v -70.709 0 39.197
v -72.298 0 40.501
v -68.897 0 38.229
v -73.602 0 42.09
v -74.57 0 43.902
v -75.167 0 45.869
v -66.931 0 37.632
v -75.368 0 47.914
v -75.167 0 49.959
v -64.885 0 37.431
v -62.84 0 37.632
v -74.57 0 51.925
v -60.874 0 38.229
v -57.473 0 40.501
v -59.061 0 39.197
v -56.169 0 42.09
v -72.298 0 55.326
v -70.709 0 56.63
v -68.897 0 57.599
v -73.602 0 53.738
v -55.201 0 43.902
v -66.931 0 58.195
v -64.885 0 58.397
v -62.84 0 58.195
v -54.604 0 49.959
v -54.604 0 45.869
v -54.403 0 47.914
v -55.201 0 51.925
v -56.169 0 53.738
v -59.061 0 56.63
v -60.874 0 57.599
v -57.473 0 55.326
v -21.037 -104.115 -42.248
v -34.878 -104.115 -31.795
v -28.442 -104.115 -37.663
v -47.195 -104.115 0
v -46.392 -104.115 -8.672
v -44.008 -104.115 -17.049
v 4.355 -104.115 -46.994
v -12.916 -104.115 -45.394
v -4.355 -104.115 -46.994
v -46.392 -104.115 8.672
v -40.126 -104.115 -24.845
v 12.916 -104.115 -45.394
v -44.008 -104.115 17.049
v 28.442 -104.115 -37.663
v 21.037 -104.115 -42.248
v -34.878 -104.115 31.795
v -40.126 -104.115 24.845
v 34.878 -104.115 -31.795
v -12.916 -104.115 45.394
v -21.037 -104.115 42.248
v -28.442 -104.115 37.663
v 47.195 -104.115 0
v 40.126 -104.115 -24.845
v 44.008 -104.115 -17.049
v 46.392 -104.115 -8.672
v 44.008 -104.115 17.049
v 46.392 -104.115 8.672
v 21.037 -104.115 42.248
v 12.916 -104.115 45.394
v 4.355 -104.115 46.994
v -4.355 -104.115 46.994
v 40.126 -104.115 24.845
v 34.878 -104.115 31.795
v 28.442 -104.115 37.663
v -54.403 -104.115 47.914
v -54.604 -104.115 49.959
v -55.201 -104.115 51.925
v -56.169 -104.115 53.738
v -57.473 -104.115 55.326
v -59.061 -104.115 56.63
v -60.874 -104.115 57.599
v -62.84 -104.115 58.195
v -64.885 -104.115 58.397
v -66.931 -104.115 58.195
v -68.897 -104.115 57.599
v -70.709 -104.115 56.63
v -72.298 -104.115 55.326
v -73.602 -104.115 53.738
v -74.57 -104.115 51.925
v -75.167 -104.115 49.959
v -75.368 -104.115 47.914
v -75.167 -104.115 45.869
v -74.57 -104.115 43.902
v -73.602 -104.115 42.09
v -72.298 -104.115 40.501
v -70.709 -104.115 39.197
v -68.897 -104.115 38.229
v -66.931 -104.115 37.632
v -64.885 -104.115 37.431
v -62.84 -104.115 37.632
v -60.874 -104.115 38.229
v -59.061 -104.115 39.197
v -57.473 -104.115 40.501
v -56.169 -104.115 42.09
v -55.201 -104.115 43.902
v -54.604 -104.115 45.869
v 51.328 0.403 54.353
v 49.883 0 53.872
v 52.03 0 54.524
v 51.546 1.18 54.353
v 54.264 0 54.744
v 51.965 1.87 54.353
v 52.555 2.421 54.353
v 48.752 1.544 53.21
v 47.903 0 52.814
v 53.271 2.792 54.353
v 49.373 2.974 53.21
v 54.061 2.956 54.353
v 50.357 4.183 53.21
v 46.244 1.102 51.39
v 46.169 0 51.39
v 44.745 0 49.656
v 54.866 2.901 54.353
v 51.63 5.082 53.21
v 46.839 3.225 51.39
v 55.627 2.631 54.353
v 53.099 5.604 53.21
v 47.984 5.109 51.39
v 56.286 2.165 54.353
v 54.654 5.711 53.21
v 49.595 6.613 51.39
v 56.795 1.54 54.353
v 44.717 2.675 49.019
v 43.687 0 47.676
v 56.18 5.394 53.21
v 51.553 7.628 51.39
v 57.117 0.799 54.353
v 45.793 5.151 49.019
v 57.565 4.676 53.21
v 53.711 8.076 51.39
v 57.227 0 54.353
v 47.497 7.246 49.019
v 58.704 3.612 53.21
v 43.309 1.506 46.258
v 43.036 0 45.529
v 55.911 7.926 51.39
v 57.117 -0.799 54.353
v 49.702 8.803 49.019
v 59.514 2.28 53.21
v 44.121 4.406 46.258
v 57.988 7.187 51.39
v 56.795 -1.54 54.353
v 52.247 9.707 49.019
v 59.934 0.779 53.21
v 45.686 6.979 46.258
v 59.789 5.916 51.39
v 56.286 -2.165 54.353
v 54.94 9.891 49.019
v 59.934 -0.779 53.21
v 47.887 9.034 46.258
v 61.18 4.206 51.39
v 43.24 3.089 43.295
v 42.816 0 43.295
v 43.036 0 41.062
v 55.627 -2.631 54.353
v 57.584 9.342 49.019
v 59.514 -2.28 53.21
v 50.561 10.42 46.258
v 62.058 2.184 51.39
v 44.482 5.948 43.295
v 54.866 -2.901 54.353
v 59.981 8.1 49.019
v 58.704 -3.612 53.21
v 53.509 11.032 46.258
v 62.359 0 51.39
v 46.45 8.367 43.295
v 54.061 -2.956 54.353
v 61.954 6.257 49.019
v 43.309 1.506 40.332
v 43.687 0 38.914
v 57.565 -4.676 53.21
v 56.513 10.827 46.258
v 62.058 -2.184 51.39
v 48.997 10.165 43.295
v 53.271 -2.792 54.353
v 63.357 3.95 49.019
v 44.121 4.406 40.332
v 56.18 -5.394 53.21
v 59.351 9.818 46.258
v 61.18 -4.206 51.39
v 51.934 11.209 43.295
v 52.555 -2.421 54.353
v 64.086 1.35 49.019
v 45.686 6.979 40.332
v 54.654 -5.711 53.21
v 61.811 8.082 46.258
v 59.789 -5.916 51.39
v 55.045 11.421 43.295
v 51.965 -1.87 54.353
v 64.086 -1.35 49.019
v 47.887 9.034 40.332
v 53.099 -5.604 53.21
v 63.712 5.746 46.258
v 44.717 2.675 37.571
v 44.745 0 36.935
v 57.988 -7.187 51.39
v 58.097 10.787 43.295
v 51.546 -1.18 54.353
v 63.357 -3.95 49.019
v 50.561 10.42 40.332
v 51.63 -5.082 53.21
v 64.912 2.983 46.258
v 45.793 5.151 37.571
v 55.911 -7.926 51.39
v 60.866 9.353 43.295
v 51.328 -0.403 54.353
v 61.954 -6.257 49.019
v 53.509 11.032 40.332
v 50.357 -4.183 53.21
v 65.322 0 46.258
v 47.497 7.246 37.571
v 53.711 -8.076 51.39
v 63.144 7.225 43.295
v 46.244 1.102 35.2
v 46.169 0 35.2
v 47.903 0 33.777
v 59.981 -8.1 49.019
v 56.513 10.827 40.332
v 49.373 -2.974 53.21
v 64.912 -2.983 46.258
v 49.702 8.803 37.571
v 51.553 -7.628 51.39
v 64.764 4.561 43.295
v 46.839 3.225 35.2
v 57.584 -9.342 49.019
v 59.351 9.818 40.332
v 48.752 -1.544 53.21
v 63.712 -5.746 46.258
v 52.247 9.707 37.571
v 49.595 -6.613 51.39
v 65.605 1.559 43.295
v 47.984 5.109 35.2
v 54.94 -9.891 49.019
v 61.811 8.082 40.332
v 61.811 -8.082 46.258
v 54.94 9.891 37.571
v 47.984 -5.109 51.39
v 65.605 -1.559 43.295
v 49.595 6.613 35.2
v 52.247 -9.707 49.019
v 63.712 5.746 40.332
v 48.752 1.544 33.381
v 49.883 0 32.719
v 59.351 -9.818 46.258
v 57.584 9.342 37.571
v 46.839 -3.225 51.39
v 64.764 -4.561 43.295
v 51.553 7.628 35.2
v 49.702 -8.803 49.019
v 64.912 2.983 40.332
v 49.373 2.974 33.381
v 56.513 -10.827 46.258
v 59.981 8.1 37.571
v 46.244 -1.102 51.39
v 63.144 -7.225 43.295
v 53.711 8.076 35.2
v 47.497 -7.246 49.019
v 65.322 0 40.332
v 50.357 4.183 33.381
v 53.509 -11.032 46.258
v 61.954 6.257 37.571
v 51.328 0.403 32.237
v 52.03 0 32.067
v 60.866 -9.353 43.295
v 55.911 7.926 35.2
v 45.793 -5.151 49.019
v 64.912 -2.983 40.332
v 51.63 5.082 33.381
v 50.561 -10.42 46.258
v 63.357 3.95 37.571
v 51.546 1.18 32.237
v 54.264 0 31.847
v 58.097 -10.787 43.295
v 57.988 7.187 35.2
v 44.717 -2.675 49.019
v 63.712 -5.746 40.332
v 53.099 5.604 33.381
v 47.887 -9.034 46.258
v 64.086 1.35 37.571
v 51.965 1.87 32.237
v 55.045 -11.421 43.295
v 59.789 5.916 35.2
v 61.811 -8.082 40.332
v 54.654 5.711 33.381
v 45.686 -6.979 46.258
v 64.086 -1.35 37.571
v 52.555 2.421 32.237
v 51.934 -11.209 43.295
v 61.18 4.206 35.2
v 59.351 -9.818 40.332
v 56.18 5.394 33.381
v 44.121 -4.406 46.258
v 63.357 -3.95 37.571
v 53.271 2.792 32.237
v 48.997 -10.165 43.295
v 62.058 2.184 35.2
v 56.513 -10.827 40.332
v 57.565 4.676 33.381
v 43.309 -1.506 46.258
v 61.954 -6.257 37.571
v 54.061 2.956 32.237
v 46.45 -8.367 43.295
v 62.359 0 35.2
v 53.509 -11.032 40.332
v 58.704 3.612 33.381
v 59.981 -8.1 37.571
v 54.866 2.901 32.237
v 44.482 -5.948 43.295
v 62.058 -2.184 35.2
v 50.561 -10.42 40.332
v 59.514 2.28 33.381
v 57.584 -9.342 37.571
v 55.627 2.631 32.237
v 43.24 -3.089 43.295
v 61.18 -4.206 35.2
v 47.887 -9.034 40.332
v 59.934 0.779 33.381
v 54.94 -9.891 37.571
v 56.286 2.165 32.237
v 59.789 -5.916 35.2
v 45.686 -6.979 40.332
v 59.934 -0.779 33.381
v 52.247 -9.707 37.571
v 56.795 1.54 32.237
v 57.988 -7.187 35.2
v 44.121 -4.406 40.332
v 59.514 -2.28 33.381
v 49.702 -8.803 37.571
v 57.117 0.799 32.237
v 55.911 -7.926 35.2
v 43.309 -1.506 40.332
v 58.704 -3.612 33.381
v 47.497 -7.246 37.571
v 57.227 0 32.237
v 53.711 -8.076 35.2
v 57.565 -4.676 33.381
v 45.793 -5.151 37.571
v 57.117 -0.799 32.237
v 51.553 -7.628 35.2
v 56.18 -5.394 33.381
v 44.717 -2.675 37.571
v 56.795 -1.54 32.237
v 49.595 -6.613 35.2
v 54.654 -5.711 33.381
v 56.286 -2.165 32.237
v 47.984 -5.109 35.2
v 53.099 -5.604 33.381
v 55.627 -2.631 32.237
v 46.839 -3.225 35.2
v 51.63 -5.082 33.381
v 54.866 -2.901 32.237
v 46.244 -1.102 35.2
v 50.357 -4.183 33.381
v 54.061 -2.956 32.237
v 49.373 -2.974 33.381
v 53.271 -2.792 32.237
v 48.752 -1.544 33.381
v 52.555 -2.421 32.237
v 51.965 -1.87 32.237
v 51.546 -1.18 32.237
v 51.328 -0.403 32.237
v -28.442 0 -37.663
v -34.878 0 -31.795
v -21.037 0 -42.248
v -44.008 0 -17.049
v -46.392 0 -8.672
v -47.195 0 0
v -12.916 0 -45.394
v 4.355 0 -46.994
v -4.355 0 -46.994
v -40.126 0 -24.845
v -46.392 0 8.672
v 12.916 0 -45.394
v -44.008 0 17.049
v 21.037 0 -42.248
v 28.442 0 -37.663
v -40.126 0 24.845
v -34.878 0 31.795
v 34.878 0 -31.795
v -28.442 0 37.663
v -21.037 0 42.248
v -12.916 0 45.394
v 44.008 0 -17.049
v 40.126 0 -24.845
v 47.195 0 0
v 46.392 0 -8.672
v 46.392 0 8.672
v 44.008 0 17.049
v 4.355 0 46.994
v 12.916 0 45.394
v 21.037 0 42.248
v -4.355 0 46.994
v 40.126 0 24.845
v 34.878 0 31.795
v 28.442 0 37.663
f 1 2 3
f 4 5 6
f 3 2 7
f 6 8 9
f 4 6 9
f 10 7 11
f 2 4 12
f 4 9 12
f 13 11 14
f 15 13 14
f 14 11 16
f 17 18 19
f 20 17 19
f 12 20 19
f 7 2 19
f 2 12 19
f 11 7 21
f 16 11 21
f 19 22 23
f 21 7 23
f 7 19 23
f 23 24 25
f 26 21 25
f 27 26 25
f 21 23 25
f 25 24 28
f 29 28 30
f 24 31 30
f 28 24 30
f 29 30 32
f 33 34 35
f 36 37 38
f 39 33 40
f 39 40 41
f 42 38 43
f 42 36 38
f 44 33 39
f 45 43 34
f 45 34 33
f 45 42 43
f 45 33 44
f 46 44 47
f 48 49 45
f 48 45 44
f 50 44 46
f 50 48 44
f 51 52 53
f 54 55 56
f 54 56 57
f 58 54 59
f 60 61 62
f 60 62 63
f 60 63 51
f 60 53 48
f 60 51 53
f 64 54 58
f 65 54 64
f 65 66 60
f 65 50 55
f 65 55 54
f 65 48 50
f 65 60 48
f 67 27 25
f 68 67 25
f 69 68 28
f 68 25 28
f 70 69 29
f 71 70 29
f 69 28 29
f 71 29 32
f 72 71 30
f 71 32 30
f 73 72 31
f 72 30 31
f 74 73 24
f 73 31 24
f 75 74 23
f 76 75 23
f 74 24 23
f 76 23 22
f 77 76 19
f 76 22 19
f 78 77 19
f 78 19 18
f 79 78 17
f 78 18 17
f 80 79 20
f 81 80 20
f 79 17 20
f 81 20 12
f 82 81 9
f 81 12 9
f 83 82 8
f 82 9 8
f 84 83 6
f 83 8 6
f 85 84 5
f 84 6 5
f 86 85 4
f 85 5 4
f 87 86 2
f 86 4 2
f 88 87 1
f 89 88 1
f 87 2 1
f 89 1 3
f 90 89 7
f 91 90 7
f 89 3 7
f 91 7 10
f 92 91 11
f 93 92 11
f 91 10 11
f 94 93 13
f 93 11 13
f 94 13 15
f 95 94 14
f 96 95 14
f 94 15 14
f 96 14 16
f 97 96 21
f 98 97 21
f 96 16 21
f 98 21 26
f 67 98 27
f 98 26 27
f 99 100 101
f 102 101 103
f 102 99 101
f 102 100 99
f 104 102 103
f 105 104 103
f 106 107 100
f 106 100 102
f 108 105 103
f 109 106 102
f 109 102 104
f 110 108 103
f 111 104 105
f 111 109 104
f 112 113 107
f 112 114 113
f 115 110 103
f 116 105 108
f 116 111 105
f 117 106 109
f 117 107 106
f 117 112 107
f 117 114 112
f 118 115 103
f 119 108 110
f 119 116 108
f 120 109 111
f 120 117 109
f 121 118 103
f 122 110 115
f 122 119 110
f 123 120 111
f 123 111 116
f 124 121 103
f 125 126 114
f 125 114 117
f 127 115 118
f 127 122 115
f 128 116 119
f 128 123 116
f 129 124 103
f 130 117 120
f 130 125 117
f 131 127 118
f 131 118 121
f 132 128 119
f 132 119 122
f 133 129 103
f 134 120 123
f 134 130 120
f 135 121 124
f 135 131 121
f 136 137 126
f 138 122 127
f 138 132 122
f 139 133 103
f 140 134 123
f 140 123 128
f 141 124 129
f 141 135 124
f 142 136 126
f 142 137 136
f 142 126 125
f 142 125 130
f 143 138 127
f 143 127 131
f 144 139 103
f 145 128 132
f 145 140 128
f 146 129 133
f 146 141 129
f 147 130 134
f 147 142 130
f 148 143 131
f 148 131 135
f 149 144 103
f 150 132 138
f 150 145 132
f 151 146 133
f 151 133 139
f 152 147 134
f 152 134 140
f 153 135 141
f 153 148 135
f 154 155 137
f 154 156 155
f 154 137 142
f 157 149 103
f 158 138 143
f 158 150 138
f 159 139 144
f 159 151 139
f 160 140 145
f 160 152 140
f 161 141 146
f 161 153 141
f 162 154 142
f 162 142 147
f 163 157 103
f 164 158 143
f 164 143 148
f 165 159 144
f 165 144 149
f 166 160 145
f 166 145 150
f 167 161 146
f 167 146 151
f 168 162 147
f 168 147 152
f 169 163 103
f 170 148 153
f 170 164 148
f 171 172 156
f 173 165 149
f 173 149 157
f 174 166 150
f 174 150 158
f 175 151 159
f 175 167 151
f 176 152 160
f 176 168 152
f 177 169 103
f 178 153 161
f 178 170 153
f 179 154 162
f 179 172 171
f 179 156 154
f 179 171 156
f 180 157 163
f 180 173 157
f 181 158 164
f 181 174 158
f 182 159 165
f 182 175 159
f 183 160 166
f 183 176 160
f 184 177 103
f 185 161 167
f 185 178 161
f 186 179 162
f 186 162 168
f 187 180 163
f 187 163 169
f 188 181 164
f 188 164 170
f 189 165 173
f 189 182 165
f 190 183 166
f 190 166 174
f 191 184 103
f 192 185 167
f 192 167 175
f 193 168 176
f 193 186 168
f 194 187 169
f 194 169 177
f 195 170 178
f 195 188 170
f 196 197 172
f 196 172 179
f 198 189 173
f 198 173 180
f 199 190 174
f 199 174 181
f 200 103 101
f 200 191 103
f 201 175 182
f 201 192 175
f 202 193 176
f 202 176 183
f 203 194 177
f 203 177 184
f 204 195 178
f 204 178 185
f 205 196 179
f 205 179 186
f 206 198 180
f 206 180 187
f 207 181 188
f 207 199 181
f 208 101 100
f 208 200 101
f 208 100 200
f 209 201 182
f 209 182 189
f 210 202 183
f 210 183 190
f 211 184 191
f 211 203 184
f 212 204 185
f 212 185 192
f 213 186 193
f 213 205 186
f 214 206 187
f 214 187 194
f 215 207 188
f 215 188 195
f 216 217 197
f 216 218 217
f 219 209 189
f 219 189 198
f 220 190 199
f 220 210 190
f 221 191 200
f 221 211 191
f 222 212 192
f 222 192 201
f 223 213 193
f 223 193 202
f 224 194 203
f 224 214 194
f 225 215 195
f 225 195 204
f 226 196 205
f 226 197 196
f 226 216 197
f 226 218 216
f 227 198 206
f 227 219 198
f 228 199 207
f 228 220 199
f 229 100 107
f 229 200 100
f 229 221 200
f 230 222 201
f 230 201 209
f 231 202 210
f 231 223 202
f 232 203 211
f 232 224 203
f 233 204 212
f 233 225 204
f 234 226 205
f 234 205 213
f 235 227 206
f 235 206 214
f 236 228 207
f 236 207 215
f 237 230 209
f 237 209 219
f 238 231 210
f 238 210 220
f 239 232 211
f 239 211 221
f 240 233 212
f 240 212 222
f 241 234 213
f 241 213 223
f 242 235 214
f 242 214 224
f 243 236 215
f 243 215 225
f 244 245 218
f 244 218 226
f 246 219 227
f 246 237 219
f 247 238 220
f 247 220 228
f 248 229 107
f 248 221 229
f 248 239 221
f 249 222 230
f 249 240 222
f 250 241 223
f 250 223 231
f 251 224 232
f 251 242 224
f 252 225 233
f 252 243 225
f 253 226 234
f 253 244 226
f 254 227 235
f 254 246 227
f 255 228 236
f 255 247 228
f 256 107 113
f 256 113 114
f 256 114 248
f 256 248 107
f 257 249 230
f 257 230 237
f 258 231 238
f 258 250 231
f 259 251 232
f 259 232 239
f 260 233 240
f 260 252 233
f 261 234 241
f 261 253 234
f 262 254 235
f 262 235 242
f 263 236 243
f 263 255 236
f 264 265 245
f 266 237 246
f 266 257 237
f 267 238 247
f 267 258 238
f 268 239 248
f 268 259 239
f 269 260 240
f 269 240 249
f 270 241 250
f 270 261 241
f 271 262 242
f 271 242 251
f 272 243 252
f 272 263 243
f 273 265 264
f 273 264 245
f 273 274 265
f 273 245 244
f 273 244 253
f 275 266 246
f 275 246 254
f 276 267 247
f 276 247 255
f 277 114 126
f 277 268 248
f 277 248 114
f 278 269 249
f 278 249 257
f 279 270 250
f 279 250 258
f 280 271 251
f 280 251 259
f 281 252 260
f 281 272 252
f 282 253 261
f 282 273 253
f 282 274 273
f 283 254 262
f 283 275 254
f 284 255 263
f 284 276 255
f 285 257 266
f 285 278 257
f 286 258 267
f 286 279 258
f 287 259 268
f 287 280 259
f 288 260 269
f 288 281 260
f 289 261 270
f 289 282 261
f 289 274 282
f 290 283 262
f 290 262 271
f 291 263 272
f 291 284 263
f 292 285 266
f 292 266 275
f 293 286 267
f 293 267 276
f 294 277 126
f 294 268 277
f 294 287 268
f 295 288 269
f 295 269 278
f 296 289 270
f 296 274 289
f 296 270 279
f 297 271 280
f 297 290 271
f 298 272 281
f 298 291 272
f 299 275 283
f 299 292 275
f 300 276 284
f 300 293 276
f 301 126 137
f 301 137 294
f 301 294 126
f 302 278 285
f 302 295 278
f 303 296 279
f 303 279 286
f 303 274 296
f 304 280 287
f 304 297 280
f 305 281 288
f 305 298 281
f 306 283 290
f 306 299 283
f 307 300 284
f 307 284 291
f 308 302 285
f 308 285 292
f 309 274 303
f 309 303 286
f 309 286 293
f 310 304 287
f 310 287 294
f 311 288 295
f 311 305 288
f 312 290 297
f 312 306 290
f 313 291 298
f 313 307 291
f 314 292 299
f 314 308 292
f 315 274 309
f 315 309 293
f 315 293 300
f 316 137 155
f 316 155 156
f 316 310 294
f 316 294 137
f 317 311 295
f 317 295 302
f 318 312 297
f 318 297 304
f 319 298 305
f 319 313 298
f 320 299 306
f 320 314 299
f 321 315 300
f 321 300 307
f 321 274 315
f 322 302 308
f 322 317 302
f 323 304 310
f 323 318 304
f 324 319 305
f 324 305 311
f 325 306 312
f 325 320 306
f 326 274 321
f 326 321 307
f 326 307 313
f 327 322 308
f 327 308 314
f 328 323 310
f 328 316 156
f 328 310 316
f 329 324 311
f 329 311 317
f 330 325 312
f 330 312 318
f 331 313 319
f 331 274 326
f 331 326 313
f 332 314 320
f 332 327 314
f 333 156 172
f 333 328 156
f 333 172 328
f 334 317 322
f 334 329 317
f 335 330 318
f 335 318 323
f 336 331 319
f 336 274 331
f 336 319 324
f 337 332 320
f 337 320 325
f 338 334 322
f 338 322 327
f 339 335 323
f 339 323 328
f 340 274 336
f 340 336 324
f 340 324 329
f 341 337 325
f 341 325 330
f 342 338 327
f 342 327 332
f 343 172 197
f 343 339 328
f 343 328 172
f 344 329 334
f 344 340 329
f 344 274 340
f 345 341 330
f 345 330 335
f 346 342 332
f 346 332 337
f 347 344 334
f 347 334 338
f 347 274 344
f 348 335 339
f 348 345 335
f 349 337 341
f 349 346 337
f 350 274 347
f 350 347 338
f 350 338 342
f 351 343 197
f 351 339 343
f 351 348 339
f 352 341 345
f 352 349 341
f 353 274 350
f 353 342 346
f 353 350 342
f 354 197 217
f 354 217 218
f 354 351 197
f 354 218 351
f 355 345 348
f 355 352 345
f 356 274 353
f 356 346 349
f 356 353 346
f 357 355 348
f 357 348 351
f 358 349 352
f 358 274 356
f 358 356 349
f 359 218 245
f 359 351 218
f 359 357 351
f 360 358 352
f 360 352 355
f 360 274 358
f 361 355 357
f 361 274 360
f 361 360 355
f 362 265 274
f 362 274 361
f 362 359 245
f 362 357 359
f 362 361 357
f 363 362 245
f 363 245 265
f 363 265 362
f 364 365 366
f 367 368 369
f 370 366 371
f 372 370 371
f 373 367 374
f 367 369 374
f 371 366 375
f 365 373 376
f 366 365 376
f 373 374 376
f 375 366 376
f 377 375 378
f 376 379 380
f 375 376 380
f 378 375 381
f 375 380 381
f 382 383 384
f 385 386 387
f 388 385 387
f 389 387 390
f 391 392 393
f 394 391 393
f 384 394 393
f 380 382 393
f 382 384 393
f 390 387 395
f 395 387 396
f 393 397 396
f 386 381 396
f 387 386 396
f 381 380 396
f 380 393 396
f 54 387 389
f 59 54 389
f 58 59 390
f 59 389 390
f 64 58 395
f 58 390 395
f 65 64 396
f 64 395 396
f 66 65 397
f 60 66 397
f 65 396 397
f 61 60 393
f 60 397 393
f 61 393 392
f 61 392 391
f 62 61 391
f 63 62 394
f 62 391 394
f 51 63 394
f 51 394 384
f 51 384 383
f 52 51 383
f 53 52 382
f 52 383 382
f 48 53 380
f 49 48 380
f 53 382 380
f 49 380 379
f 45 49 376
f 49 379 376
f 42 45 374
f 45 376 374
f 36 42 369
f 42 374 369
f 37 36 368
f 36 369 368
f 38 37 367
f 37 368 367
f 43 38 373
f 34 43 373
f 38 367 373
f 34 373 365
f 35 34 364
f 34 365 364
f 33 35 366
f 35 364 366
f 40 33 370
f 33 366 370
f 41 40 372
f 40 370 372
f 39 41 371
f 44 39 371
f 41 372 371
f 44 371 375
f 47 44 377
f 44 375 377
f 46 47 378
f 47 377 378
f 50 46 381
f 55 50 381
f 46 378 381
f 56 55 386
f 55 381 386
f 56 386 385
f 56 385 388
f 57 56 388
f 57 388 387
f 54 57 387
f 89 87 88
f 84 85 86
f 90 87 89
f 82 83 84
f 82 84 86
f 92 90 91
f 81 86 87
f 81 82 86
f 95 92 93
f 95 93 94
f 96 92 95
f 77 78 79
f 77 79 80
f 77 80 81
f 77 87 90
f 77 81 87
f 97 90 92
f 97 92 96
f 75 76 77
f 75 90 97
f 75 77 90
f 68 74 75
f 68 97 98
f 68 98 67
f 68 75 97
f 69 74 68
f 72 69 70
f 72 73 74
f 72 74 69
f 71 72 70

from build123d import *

# Parameters (mm, degrees)
F2_R     = 10.482872
F2_R_2   = 47.195497
F3_DEPTH = 104.1151


with BuildPart() as f1:
    # F0 (on Front) → F1 (revolve)
    with BuildSketch(Plane.XZ):
        with BuildLine():
            Line((54.263636, 31.847387), (54.263636, 54.743521))
            ThreePointArc((54.263636, 54.743521), (42.815569, 43.295454), (54.263636, 31.847387))
        make_face()
    revolve(axis=Axis((54.263636, 0, 43.295454), (0, 0, -1)))


with BuildPart() as f3:
    # F2 (on Front) → F3 (new body)
    with BuildSketch(Plane.XZ):
        with Locations((-64.885452, 47.913637)):
            Circle(F2_R)
        Circle(F2_R_2)
    extrude(amount=F3_DEPTH)


solid = Compound([f1.part, f3.part])
